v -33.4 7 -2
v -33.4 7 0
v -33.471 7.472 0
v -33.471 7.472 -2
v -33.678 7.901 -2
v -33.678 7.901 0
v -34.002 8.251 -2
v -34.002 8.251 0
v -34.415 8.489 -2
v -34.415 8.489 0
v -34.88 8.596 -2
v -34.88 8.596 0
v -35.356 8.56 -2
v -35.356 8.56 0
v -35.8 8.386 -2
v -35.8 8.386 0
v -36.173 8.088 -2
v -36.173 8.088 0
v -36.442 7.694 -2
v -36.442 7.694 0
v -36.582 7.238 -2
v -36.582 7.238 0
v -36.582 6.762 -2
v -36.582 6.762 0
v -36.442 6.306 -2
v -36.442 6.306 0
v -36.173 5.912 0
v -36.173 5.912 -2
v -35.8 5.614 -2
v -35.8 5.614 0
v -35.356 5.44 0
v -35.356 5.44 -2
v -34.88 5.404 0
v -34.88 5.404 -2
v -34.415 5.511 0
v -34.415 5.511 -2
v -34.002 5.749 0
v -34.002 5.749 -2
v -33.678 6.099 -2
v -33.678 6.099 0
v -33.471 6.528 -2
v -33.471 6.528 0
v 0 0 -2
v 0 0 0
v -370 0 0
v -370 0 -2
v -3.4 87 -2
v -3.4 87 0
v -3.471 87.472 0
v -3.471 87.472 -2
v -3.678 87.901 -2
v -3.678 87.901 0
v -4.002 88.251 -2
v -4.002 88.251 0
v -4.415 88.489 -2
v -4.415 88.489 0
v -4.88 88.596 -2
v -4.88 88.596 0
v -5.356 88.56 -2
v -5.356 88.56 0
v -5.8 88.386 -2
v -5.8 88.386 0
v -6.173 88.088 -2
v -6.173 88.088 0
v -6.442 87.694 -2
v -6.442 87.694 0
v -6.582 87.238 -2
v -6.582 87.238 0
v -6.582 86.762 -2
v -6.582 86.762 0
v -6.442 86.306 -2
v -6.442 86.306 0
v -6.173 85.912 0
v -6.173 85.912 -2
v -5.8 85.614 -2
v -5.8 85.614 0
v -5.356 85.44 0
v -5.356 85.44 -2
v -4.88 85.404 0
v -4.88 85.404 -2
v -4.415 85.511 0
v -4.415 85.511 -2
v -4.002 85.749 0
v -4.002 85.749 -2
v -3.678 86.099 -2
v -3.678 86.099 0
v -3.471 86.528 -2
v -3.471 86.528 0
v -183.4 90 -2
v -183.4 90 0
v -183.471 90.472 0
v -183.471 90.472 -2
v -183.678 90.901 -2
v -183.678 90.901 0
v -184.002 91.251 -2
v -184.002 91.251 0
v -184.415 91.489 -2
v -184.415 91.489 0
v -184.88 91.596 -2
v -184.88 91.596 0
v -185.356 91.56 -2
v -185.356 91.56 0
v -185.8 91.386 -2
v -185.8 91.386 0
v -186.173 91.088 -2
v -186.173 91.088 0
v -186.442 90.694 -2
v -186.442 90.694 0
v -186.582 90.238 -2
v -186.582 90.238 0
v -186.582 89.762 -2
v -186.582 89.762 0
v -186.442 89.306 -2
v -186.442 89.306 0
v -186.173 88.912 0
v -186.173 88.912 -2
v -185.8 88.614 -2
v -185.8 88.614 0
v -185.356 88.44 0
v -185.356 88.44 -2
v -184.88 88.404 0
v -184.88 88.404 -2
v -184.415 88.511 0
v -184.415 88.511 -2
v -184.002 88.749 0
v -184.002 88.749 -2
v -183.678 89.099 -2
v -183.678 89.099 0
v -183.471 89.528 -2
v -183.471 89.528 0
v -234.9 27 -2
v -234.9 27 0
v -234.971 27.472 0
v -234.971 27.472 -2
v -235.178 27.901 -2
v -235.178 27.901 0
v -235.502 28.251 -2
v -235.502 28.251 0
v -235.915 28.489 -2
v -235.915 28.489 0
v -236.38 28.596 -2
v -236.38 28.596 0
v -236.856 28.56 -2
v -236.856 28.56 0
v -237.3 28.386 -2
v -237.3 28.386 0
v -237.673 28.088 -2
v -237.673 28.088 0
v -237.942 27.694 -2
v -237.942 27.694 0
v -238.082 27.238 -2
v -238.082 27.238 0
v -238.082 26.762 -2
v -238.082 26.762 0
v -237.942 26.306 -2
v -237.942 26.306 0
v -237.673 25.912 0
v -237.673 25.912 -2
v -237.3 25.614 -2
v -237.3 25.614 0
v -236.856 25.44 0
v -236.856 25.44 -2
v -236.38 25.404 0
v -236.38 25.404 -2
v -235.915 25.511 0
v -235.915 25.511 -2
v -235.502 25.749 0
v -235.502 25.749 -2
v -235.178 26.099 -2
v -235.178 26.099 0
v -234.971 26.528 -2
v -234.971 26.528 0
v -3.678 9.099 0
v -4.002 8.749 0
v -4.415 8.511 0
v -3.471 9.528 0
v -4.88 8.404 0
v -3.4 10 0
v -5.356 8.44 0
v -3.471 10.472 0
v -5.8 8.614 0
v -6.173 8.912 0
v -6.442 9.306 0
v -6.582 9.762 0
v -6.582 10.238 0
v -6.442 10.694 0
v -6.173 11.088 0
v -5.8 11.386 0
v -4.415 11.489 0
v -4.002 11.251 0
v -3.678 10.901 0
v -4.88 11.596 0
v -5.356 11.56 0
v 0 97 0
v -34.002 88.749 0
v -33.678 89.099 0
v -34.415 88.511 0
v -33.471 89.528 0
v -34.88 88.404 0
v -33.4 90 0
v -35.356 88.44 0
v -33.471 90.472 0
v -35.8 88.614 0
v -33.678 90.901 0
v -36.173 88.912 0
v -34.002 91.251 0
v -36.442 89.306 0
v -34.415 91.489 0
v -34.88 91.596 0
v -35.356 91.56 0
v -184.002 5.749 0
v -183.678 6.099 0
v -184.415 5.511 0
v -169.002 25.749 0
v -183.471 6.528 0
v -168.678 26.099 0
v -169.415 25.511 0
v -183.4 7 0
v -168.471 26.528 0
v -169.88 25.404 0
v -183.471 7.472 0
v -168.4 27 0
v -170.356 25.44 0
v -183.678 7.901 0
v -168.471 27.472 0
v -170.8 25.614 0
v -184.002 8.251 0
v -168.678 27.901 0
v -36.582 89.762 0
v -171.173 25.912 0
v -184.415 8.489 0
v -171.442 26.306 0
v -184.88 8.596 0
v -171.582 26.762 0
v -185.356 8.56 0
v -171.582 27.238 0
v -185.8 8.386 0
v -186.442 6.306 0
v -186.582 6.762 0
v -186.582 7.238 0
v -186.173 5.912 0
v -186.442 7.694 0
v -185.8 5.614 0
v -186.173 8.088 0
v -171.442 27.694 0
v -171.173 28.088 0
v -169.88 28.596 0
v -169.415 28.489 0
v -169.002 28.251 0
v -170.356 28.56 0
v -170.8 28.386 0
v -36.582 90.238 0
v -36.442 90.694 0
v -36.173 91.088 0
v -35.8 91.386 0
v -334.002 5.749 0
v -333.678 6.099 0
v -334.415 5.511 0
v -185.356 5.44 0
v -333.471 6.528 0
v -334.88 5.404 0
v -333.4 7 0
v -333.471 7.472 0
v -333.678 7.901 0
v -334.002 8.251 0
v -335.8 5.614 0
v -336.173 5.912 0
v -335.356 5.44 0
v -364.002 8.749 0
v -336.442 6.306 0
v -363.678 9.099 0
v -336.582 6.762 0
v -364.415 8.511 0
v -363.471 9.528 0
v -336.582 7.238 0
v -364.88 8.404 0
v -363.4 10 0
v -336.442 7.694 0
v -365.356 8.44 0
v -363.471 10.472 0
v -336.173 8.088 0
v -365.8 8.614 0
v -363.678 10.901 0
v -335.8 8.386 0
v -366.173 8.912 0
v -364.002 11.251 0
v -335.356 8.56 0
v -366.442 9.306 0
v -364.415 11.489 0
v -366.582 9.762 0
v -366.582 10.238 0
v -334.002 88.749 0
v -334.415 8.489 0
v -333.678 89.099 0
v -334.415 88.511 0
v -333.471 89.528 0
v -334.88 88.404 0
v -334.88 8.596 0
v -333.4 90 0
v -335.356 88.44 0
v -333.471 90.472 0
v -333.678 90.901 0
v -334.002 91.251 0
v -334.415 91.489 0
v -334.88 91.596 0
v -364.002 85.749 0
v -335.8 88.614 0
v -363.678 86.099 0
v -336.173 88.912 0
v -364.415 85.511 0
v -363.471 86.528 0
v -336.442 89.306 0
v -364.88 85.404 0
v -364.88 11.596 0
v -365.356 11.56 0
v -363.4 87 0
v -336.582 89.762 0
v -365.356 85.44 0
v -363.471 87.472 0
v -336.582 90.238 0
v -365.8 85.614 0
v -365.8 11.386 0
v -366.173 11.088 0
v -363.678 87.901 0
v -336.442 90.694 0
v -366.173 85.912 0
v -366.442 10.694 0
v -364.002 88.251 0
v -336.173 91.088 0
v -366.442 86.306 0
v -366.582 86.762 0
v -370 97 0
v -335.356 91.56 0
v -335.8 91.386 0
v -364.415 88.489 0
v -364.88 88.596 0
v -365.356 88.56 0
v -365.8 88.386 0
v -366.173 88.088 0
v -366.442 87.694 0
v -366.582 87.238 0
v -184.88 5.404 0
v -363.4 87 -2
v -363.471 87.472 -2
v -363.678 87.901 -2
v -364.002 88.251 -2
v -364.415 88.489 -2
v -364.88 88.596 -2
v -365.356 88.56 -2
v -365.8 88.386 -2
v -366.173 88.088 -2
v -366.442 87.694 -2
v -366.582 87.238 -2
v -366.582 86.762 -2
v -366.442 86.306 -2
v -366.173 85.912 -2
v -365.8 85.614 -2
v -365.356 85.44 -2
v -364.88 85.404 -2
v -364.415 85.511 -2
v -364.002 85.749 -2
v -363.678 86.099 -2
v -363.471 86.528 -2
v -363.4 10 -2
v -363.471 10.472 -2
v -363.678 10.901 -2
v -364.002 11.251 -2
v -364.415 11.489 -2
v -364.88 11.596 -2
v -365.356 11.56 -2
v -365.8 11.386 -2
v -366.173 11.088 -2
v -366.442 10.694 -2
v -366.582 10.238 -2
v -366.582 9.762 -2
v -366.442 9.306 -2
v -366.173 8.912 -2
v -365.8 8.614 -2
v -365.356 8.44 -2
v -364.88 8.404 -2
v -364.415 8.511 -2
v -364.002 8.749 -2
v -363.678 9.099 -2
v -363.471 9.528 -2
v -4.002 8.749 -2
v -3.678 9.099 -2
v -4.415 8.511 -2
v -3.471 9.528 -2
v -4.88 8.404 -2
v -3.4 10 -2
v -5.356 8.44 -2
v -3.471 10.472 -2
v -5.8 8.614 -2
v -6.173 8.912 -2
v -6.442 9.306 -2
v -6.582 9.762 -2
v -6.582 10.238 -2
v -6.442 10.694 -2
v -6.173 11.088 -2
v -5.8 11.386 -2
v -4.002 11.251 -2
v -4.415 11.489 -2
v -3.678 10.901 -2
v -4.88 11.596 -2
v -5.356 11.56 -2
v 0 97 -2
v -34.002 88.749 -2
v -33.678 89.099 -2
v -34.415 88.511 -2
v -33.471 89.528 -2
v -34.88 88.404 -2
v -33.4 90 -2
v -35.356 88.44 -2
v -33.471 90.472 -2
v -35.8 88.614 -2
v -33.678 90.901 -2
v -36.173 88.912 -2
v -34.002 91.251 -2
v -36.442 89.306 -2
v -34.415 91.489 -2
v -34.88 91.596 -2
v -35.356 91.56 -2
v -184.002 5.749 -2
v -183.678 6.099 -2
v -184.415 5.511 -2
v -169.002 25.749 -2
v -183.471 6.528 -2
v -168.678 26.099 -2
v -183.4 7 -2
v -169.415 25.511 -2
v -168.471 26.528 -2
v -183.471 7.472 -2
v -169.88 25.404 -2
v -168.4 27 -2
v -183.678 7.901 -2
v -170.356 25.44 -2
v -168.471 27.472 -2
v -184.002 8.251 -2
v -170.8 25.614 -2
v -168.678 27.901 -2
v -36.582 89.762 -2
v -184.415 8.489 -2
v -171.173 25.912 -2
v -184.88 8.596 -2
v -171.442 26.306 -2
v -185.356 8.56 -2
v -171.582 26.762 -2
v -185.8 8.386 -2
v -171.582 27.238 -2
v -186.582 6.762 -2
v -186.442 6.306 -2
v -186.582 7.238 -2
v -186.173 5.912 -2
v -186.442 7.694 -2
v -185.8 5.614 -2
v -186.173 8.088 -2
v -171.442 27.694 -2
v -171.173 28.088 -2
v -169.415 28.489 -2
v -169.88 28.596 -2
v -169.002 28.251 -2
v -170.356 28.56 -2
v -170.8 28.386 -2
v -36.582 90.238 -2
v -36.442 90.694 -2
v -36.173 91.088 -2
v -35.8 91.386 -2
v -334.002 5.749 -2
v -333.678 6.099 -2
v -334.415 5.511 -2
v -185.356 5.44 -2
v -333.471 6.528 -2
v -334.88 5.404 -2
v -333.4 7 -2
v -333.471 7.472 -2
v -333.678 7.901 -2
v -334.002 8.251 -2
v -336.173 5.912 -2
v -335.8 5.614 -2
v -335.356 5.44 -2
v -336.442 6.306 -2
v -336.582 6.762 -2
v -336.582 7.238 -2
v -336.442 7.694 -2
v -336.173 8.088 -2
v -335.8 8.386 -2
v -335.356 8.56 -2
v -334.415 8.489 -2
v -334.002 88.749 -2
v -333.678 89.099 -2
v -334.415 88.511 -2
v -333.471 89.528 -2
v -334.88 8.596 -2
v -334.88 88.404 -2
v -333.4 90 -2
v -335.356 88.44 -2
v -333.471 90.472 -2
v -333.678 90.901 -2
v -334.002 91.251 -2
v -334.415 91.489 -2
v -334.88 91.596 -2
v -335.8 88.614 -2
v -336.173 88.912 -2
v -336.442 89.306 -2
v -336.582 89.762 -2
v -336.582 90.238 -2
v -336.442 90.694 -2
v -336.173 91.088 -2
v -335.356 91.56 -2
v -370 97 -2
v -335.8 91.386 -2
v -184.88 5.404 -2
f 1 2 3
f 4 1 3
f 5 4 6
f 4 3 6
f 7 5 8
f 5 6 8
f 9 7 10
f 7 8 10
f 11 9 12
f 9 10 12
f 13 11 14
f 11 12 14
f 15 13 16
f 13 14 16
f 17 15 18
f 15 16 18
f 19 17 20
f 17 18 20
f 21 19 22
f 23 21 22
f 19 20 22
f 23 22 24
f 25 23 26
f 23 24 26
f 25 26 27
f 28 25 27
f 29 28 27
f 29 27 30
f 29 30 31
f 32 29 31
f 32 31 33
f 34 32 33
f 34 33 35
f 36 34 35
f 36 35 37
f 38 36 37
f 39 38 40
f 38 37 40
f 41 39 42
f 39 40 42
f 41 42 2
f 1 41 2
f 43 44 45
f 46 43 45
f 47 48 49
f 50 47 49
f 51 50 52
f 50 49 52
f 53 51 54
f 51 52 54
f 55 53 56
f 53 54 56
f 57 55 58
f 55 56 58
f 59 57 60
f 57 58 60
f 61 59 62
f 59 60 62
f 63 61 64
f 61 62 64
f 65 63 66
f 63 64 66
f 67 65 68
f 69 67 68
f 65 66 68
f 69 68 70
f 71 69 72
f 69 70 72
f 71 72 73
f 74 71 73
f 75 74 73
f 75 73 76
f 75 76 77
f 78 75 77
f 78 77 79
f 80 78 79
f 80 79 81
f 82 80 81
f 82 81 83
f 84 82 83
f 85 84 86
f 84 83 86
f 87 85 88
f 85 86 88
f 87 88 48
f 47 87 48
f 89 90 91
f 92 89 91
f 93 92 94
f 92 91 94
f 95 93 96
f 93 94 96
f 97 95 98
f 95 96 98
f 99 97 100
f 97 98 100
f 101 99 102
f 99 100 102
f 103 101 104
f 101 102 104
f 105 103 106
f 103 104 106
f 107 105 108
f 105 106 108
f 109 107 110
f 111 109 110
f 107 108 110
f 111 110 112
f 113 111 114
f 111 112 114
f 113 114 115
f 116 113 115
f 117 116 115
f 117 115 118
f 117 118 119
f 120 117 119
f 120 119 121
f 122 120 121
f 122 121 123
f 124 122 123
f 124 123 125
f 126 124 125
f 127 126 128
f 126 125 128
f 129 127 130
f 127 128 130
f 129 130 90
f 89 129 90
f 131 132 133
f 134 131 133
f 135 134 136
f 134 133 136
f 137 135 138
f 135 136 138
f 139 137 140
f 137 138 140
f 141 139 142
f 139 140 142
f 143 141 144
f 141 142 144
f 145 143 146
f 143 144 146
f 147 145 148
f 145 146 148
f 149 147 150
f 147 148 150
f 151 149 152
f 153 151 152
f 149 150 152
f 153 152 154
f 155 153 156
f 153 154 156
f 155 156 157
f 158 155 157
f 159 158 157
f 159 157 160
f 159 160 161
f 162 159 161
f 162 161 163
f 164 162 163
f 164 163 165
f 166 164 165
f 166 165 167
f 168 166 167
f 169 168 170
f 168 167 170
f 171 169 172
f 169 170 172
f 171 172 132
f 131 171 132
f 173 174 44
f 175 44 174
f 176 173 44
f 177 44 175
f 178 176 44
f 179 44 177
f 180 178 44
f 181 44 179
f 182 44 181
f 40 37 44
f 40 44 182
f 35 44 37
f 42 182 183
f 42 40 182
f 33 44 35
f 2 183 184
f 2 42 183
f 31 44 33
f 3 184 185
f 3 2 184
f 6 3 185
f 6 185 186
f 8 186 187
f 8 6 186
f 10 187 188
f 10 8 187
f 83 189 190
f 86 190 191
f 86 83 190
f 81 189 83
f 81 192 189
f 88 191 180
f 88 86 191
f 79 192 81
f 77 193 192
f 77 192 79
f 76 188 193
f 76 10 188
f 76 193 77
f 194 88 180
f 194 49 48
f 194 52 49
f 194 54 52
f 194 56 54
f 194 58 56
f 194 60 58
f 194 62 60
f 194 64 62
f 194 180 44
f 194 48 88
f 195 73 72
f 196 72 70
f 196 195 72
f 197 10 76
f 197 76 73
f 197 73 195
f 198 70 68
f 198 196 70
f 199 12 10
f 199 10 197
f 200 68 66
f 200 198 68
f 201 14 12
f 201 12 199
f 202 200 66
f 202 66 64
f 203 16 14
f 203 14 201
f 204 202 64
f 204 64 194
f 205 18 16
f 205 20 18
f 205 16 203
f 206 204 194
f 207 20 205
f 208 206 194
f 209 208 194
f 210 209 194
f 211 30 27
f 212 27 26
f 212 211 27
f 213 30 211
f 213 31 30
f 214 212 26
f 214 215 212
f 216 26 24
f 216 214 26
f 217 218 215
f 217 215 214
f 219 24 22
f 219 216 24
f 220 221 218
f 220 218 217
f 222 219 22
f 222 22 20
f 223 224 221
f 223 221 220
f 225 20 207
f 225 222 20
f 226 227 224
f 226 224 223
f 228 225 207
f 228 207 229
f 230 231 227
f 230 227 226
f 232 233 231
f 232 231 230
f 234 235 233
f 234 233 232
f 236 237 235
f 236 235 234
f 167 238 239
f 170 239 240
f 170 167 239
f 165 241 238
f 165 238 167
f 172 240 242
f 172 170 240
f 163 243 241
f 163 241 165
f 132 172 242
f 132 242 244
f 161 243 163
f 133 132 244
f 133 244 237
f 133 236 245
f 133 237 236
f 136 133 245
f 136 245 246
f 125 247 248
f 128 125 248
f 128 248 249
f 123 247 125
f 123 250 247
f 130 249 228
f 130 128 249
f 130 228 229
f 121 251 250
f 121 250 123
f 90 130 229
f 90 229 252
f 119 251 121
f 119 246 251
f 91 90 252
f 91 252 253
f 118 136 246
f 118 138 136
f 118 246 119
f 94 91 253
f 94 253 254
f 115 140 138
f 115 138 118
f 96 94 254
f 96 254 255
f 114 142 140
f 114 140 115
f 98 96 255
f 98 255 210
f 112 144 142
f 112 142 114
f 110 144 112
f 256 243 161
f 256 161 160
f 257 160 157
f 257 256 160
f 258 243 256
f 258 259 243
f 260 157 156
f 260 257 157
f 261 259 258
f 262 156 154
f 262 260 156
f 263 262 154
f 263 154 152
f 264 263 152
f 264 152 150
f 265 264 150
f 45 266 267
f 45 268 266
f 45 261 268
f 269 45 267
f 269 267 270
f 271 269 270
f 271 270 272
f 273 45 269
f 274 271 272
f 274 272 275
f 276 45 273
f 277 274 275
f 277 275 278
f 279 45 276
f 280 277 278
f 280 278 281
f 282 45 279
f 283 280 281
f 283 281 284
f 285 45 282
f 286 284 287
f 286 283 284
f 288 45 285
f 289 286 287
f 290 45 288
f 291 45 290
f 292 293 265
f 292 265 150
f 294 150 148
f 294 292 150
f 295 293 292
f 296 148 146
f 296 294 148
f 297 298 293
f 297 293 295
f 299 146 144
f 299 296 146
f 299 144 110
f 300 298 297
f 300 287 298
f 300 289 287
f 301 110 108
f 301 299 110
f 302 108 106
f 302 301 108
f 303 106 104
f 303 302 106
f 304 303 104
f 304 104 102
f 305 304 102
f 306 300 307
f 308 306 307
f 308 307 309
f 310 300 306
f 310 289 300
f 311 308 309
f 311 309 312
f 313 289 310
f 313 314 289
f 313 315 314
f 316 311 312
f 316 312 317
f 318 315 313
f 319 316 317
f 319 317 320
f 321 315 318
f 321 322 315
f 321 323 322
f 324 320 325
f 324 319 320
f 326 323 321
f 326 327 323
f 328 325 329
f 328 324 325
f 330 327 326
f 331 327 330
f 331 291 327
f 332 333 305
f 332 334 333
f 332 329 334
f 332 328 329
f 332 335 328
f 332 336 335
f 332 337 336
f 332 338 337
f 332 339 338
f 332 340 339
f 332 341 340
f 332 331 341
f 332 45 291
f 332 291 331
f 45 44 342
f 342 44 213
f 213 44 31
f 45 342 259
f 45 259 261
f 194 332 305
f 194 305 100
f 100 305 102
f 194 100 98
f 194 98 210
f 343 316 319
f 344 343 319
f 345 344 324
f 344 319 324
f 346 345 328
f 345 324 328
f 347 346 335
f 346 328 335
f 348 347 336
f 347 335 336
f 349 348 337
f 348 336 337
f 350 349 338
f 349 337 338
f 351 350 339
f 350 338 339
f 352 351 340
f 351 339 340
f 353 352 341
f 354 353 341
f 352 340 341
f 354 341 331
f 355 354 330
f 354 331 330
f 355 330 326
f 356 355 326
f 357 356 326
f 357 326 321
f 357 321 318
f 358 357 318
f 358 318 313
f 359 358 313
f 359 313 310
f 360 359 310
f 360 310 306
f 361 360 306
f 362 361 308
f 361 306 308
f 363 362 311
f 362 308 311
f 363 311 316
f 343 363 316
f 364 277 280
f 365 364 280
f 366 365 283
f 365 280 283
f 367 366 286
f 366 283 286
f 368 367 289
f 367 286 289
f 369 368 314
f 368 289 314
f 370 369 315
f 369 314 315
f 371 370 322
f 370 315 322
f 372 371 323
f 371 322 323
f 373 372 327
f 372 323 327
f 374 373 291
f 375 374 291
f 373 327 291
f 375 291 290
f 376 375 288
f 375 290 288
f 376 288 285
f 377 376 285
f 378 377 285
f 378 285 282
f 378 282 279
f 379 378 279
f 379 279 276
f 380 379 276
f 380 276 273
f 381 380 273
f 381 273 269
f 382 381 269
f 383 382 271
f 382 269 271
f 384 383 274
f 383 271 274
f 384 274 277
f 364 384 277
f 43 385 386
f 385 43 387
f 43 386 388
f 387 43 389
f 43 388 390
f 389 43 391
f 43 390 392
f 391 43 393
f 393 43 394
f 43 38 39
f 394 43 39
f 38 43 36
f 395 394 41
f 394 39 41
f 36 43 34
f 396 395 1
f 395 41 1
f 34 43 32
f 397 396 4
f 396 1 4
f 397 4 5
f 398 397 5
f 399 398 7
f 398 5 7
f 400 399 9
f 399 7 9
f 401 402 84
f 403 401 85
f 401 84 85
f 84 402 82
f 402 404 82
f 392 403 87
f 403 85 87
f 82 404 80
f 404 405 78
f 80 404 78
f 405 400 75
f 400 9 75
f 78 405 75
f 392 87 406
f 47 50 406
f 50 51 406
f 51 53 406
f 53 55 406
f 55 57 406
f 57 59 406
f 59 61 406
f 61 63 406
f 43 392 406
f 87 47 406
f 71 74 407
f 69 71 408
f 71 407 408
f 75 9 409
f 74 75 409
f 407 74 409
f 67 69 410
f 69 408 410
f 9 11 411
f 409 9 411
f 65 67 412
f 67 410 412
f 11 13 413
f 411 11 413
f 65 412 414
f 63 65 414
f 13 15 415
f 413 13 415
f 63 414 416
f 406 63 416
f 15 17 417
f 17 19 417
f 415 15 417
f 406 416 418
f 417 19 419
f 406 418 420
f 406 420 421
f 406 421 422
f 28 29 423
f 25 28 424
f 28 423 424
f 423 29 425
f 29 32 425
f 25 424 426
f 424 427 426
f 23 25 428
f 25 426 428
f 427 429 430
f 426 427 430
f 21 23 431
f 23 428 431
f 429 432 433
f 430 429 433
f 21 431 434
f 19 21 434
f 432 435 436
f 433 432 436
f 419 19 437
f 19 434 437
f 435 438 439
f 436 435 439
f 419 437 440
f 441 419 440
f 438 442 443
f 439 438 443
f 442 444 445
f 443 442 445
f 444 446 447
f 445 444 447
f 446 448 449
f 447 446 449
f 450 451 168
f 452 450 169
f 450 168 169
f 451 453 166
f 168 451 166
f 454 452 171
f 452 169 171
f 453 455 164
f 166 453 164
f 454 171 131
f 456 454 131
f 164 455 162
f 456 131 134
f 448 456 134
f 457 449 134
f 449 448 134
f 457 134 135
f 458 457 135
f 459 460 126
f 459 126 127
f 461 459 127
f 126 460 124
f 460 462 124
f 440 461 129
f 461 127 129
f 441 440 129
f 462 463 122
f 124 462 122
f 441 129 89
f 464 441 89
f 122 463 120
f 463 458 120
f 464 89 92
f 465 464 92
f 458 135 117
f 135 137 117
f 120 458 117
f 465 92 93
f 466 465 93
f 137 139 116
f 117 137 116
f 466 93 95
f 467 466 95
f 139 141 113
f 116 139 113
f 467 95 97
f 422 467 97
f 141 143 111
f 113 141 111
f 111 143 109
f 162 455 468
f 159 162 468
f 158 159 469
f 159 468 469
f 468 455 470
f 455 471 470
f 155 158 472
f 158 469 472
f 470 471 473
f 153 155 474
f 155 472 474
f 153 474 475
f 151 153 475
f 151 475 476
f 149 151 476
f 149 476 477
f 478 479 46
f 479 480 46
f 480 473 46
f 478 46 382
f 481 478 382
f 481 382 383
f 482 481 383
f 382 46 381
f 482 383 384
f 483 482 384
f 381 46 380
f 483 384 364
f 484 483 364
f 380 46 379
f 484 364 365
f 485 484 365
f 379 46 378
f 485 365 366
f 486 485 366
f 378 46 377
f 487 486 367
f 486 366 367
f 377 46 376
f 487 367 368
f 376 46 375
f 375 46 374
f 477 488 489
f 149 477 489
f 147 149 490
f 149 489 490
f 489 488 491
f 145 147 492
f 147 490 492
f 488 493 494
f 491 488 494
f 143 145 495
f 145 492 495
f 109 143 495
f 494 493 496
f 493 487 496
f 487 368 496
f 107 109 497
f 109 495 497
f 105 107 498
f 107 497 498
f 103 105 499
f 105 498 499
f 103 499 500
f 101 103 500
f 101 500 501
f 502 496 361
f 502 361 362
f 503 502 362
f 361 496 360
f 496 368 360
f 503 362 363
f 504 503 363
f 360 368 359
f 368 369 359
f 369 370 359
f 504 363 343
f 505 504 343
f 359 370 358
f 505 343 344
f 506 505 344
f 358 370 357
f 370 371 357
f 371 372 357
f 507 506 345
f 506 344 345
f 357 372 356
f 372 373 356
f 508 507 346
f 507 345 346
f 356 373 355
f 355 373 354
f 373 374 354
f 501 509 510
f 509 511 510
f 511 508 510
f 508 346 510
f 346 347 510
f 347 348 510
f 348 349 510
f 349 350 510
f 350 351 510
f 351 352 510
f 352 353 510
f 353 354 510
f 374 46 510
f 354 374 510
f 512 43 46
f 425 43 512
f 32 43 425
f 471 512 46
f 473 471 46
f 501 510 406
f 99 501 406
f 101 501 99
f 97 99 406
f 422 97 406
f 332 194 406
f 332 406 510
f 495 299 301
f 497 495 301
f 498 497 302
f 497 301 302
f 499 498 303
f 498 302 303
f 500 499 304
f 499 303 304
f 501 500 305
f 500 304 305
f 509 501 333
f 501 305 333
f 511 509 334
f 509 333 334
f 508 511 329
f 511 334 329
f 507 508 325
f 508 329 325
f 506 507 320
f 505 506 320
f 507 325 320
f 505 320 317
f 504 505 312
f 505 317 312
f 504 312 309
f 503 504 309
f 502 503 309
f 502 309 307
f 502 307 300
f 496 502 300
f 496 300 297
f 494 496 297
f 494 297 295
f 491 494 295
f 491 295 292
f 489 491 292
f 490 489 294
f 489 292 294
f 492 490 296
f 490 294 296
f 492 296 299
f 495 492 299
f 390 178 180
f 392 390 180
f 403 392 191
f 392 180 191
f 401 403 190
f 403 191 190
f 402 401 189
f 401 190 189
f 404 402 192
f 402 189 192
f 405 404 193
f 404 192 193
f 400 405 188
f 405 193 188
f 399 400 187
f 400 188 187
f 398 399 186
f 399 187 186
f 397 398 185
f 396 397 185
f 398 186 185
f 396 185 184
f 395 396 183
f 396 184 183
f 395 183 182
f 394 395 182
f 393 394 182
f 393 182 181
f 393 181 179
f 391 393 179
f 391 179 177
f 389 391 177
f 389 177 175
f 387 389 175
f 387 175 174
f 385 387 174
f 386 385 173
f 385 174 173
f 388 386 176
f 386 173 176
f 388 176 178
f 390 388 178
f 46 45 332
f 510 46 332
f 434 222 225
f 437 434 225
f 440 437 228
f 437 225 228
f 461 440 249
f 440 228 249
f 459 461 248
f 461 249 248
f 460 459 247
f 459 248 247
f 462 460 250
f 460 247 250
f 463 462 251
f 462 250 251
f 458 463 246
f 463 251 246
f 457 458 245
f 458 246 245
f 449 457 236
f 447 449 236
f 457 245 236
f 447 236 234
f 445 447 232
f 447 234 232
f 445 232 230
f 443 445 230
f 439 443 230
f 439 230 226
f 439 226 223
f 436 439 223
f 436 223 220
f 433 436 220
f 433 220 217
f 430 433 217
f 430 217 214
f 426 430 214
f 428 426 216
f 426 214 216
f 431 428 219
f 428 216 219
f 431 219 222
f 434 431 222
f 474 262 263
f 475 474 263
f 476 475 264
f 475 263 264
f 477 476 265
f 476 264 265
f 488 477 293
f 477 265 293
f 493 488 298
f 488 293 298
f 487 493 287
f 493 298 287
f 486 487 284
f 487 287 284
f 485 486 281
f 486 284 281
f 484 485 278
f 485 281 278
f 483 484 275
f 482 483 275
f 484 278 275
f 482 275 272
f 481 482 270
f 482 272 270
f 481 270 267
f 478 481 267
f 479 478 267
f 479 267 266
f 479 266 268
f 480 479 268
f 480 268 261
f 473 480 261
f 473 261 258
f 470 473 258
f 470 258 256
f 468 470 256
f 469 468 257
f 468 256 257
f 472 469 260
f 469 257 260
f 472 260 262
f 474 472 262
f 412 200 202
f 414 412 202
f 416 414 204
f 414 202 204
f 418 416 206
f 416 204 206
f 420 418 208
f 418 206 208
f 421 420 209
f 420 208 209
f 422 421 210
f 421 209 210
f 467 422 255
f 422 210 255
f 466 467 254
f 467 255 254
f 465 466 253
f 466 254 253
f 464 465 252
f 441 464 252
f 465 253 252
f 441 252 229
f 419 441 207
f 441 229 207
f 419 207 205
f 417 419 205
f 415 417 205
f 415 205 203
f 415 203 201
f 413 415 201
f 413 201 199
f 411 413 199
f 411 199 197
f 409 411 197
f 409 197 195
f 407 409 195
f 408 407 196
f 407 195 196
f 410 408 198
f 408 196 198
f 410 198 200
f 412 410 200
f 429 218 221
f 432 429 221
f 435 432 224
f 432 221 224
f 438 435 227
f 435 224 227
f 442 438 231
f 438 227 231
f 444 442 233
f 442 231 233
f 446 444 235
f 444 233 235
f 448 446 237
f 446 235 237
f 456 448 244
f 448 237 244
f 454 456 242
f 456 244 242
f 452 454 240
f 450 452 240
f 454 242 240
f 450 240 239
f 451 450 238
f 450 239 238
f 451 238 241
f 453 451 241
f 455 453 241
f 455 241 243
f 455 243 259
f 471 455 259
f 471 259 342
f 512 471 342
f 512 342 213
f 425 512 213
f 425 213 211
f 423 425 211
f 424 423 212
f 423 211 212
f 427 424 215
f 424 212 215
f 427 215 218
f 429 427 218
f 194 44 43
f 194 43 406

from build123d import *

# Parameters (mm, degrees)
SKETCH1_W          = 97
SKETCH1_H          = 370
SKETCH1_R          = 1.6
BASE_FLANGE1_DEPTH = 2


# Sheet-metal steps are written as plain solids
with BuildPart() as part:
    # Sketch1 → Base-Flange1 (new body)
    with BuildSketch(Plane(origin=(0, 0, 0), x_dir=(0, 1, 0), z_dir=(0, 0, 1))):
        with Locations((48.5, 185)):
            Rectangle(SKETCH1_W, SKETCH1_H)
        with Locations(Location((10, 5, 0), (0, 0, 270))):
            Circle(SKETCH1_R, mode=Mode.SUBTRACT)
        with Locations(Location((87, 5, 0), (0, 0, 270))):
            Circle(SKETCH1_R, mode=Mode.SUBTRACT)
        with Locations(Location((10, 365, 0), (0, 0, 270))):
            Circle(SKETCH1_R, mode=Mode.SUBTRACT)
        with Locations(Location((87, 365, 0), (0, 0, 270))):
            Circle(SKETCH1_R, mode=Mode.SUBTRACT)
        with Locations(Location((90, 185, 0), (0, 0, 270))):
            Circle(SKETCH1_R, mode=Mode.SUBTRACT)
        with Locations(Location((90, 35, 0), (0, 0, 270))):
            Circle(SKETCH1_R, mode=Mode.SUBTRACT)
        with Locations(Location((90, 335, 0), (0, 0, 270))):
            Circle(SKETCH1_R, mode=Mode.SUBTRACT)
        with Locations(Location((27, 236.5, 0), (0, 0, 270))):
            Circle(SKETCH1_R, mode=Mode.SUBTRACT)
        with Locations(Location((27, 170, 0), (0, 0, 270))):
            Circle(SKETCH1_R, mode=Mode.SUBTRACT)
        with Locations(Location((7, 185, 0), (0, 0, 270))):
            Circle(SKETCH1_R, mode=Mode.SUBTRACT)
        with Locations(Location((7, 335, 0), (0, 0, 270))):
            Circle(SKETCH1_R, mode=Mode.SUBTRACT)
        with Locations(Location((7, 35, 0), (0, 0, 270))):
            Circle(SKETCH1_R, mode=Mode.SUBTRACT)
    extrude(amount=-BASE_FLANGE1_DEPTH)


solid = part.part
